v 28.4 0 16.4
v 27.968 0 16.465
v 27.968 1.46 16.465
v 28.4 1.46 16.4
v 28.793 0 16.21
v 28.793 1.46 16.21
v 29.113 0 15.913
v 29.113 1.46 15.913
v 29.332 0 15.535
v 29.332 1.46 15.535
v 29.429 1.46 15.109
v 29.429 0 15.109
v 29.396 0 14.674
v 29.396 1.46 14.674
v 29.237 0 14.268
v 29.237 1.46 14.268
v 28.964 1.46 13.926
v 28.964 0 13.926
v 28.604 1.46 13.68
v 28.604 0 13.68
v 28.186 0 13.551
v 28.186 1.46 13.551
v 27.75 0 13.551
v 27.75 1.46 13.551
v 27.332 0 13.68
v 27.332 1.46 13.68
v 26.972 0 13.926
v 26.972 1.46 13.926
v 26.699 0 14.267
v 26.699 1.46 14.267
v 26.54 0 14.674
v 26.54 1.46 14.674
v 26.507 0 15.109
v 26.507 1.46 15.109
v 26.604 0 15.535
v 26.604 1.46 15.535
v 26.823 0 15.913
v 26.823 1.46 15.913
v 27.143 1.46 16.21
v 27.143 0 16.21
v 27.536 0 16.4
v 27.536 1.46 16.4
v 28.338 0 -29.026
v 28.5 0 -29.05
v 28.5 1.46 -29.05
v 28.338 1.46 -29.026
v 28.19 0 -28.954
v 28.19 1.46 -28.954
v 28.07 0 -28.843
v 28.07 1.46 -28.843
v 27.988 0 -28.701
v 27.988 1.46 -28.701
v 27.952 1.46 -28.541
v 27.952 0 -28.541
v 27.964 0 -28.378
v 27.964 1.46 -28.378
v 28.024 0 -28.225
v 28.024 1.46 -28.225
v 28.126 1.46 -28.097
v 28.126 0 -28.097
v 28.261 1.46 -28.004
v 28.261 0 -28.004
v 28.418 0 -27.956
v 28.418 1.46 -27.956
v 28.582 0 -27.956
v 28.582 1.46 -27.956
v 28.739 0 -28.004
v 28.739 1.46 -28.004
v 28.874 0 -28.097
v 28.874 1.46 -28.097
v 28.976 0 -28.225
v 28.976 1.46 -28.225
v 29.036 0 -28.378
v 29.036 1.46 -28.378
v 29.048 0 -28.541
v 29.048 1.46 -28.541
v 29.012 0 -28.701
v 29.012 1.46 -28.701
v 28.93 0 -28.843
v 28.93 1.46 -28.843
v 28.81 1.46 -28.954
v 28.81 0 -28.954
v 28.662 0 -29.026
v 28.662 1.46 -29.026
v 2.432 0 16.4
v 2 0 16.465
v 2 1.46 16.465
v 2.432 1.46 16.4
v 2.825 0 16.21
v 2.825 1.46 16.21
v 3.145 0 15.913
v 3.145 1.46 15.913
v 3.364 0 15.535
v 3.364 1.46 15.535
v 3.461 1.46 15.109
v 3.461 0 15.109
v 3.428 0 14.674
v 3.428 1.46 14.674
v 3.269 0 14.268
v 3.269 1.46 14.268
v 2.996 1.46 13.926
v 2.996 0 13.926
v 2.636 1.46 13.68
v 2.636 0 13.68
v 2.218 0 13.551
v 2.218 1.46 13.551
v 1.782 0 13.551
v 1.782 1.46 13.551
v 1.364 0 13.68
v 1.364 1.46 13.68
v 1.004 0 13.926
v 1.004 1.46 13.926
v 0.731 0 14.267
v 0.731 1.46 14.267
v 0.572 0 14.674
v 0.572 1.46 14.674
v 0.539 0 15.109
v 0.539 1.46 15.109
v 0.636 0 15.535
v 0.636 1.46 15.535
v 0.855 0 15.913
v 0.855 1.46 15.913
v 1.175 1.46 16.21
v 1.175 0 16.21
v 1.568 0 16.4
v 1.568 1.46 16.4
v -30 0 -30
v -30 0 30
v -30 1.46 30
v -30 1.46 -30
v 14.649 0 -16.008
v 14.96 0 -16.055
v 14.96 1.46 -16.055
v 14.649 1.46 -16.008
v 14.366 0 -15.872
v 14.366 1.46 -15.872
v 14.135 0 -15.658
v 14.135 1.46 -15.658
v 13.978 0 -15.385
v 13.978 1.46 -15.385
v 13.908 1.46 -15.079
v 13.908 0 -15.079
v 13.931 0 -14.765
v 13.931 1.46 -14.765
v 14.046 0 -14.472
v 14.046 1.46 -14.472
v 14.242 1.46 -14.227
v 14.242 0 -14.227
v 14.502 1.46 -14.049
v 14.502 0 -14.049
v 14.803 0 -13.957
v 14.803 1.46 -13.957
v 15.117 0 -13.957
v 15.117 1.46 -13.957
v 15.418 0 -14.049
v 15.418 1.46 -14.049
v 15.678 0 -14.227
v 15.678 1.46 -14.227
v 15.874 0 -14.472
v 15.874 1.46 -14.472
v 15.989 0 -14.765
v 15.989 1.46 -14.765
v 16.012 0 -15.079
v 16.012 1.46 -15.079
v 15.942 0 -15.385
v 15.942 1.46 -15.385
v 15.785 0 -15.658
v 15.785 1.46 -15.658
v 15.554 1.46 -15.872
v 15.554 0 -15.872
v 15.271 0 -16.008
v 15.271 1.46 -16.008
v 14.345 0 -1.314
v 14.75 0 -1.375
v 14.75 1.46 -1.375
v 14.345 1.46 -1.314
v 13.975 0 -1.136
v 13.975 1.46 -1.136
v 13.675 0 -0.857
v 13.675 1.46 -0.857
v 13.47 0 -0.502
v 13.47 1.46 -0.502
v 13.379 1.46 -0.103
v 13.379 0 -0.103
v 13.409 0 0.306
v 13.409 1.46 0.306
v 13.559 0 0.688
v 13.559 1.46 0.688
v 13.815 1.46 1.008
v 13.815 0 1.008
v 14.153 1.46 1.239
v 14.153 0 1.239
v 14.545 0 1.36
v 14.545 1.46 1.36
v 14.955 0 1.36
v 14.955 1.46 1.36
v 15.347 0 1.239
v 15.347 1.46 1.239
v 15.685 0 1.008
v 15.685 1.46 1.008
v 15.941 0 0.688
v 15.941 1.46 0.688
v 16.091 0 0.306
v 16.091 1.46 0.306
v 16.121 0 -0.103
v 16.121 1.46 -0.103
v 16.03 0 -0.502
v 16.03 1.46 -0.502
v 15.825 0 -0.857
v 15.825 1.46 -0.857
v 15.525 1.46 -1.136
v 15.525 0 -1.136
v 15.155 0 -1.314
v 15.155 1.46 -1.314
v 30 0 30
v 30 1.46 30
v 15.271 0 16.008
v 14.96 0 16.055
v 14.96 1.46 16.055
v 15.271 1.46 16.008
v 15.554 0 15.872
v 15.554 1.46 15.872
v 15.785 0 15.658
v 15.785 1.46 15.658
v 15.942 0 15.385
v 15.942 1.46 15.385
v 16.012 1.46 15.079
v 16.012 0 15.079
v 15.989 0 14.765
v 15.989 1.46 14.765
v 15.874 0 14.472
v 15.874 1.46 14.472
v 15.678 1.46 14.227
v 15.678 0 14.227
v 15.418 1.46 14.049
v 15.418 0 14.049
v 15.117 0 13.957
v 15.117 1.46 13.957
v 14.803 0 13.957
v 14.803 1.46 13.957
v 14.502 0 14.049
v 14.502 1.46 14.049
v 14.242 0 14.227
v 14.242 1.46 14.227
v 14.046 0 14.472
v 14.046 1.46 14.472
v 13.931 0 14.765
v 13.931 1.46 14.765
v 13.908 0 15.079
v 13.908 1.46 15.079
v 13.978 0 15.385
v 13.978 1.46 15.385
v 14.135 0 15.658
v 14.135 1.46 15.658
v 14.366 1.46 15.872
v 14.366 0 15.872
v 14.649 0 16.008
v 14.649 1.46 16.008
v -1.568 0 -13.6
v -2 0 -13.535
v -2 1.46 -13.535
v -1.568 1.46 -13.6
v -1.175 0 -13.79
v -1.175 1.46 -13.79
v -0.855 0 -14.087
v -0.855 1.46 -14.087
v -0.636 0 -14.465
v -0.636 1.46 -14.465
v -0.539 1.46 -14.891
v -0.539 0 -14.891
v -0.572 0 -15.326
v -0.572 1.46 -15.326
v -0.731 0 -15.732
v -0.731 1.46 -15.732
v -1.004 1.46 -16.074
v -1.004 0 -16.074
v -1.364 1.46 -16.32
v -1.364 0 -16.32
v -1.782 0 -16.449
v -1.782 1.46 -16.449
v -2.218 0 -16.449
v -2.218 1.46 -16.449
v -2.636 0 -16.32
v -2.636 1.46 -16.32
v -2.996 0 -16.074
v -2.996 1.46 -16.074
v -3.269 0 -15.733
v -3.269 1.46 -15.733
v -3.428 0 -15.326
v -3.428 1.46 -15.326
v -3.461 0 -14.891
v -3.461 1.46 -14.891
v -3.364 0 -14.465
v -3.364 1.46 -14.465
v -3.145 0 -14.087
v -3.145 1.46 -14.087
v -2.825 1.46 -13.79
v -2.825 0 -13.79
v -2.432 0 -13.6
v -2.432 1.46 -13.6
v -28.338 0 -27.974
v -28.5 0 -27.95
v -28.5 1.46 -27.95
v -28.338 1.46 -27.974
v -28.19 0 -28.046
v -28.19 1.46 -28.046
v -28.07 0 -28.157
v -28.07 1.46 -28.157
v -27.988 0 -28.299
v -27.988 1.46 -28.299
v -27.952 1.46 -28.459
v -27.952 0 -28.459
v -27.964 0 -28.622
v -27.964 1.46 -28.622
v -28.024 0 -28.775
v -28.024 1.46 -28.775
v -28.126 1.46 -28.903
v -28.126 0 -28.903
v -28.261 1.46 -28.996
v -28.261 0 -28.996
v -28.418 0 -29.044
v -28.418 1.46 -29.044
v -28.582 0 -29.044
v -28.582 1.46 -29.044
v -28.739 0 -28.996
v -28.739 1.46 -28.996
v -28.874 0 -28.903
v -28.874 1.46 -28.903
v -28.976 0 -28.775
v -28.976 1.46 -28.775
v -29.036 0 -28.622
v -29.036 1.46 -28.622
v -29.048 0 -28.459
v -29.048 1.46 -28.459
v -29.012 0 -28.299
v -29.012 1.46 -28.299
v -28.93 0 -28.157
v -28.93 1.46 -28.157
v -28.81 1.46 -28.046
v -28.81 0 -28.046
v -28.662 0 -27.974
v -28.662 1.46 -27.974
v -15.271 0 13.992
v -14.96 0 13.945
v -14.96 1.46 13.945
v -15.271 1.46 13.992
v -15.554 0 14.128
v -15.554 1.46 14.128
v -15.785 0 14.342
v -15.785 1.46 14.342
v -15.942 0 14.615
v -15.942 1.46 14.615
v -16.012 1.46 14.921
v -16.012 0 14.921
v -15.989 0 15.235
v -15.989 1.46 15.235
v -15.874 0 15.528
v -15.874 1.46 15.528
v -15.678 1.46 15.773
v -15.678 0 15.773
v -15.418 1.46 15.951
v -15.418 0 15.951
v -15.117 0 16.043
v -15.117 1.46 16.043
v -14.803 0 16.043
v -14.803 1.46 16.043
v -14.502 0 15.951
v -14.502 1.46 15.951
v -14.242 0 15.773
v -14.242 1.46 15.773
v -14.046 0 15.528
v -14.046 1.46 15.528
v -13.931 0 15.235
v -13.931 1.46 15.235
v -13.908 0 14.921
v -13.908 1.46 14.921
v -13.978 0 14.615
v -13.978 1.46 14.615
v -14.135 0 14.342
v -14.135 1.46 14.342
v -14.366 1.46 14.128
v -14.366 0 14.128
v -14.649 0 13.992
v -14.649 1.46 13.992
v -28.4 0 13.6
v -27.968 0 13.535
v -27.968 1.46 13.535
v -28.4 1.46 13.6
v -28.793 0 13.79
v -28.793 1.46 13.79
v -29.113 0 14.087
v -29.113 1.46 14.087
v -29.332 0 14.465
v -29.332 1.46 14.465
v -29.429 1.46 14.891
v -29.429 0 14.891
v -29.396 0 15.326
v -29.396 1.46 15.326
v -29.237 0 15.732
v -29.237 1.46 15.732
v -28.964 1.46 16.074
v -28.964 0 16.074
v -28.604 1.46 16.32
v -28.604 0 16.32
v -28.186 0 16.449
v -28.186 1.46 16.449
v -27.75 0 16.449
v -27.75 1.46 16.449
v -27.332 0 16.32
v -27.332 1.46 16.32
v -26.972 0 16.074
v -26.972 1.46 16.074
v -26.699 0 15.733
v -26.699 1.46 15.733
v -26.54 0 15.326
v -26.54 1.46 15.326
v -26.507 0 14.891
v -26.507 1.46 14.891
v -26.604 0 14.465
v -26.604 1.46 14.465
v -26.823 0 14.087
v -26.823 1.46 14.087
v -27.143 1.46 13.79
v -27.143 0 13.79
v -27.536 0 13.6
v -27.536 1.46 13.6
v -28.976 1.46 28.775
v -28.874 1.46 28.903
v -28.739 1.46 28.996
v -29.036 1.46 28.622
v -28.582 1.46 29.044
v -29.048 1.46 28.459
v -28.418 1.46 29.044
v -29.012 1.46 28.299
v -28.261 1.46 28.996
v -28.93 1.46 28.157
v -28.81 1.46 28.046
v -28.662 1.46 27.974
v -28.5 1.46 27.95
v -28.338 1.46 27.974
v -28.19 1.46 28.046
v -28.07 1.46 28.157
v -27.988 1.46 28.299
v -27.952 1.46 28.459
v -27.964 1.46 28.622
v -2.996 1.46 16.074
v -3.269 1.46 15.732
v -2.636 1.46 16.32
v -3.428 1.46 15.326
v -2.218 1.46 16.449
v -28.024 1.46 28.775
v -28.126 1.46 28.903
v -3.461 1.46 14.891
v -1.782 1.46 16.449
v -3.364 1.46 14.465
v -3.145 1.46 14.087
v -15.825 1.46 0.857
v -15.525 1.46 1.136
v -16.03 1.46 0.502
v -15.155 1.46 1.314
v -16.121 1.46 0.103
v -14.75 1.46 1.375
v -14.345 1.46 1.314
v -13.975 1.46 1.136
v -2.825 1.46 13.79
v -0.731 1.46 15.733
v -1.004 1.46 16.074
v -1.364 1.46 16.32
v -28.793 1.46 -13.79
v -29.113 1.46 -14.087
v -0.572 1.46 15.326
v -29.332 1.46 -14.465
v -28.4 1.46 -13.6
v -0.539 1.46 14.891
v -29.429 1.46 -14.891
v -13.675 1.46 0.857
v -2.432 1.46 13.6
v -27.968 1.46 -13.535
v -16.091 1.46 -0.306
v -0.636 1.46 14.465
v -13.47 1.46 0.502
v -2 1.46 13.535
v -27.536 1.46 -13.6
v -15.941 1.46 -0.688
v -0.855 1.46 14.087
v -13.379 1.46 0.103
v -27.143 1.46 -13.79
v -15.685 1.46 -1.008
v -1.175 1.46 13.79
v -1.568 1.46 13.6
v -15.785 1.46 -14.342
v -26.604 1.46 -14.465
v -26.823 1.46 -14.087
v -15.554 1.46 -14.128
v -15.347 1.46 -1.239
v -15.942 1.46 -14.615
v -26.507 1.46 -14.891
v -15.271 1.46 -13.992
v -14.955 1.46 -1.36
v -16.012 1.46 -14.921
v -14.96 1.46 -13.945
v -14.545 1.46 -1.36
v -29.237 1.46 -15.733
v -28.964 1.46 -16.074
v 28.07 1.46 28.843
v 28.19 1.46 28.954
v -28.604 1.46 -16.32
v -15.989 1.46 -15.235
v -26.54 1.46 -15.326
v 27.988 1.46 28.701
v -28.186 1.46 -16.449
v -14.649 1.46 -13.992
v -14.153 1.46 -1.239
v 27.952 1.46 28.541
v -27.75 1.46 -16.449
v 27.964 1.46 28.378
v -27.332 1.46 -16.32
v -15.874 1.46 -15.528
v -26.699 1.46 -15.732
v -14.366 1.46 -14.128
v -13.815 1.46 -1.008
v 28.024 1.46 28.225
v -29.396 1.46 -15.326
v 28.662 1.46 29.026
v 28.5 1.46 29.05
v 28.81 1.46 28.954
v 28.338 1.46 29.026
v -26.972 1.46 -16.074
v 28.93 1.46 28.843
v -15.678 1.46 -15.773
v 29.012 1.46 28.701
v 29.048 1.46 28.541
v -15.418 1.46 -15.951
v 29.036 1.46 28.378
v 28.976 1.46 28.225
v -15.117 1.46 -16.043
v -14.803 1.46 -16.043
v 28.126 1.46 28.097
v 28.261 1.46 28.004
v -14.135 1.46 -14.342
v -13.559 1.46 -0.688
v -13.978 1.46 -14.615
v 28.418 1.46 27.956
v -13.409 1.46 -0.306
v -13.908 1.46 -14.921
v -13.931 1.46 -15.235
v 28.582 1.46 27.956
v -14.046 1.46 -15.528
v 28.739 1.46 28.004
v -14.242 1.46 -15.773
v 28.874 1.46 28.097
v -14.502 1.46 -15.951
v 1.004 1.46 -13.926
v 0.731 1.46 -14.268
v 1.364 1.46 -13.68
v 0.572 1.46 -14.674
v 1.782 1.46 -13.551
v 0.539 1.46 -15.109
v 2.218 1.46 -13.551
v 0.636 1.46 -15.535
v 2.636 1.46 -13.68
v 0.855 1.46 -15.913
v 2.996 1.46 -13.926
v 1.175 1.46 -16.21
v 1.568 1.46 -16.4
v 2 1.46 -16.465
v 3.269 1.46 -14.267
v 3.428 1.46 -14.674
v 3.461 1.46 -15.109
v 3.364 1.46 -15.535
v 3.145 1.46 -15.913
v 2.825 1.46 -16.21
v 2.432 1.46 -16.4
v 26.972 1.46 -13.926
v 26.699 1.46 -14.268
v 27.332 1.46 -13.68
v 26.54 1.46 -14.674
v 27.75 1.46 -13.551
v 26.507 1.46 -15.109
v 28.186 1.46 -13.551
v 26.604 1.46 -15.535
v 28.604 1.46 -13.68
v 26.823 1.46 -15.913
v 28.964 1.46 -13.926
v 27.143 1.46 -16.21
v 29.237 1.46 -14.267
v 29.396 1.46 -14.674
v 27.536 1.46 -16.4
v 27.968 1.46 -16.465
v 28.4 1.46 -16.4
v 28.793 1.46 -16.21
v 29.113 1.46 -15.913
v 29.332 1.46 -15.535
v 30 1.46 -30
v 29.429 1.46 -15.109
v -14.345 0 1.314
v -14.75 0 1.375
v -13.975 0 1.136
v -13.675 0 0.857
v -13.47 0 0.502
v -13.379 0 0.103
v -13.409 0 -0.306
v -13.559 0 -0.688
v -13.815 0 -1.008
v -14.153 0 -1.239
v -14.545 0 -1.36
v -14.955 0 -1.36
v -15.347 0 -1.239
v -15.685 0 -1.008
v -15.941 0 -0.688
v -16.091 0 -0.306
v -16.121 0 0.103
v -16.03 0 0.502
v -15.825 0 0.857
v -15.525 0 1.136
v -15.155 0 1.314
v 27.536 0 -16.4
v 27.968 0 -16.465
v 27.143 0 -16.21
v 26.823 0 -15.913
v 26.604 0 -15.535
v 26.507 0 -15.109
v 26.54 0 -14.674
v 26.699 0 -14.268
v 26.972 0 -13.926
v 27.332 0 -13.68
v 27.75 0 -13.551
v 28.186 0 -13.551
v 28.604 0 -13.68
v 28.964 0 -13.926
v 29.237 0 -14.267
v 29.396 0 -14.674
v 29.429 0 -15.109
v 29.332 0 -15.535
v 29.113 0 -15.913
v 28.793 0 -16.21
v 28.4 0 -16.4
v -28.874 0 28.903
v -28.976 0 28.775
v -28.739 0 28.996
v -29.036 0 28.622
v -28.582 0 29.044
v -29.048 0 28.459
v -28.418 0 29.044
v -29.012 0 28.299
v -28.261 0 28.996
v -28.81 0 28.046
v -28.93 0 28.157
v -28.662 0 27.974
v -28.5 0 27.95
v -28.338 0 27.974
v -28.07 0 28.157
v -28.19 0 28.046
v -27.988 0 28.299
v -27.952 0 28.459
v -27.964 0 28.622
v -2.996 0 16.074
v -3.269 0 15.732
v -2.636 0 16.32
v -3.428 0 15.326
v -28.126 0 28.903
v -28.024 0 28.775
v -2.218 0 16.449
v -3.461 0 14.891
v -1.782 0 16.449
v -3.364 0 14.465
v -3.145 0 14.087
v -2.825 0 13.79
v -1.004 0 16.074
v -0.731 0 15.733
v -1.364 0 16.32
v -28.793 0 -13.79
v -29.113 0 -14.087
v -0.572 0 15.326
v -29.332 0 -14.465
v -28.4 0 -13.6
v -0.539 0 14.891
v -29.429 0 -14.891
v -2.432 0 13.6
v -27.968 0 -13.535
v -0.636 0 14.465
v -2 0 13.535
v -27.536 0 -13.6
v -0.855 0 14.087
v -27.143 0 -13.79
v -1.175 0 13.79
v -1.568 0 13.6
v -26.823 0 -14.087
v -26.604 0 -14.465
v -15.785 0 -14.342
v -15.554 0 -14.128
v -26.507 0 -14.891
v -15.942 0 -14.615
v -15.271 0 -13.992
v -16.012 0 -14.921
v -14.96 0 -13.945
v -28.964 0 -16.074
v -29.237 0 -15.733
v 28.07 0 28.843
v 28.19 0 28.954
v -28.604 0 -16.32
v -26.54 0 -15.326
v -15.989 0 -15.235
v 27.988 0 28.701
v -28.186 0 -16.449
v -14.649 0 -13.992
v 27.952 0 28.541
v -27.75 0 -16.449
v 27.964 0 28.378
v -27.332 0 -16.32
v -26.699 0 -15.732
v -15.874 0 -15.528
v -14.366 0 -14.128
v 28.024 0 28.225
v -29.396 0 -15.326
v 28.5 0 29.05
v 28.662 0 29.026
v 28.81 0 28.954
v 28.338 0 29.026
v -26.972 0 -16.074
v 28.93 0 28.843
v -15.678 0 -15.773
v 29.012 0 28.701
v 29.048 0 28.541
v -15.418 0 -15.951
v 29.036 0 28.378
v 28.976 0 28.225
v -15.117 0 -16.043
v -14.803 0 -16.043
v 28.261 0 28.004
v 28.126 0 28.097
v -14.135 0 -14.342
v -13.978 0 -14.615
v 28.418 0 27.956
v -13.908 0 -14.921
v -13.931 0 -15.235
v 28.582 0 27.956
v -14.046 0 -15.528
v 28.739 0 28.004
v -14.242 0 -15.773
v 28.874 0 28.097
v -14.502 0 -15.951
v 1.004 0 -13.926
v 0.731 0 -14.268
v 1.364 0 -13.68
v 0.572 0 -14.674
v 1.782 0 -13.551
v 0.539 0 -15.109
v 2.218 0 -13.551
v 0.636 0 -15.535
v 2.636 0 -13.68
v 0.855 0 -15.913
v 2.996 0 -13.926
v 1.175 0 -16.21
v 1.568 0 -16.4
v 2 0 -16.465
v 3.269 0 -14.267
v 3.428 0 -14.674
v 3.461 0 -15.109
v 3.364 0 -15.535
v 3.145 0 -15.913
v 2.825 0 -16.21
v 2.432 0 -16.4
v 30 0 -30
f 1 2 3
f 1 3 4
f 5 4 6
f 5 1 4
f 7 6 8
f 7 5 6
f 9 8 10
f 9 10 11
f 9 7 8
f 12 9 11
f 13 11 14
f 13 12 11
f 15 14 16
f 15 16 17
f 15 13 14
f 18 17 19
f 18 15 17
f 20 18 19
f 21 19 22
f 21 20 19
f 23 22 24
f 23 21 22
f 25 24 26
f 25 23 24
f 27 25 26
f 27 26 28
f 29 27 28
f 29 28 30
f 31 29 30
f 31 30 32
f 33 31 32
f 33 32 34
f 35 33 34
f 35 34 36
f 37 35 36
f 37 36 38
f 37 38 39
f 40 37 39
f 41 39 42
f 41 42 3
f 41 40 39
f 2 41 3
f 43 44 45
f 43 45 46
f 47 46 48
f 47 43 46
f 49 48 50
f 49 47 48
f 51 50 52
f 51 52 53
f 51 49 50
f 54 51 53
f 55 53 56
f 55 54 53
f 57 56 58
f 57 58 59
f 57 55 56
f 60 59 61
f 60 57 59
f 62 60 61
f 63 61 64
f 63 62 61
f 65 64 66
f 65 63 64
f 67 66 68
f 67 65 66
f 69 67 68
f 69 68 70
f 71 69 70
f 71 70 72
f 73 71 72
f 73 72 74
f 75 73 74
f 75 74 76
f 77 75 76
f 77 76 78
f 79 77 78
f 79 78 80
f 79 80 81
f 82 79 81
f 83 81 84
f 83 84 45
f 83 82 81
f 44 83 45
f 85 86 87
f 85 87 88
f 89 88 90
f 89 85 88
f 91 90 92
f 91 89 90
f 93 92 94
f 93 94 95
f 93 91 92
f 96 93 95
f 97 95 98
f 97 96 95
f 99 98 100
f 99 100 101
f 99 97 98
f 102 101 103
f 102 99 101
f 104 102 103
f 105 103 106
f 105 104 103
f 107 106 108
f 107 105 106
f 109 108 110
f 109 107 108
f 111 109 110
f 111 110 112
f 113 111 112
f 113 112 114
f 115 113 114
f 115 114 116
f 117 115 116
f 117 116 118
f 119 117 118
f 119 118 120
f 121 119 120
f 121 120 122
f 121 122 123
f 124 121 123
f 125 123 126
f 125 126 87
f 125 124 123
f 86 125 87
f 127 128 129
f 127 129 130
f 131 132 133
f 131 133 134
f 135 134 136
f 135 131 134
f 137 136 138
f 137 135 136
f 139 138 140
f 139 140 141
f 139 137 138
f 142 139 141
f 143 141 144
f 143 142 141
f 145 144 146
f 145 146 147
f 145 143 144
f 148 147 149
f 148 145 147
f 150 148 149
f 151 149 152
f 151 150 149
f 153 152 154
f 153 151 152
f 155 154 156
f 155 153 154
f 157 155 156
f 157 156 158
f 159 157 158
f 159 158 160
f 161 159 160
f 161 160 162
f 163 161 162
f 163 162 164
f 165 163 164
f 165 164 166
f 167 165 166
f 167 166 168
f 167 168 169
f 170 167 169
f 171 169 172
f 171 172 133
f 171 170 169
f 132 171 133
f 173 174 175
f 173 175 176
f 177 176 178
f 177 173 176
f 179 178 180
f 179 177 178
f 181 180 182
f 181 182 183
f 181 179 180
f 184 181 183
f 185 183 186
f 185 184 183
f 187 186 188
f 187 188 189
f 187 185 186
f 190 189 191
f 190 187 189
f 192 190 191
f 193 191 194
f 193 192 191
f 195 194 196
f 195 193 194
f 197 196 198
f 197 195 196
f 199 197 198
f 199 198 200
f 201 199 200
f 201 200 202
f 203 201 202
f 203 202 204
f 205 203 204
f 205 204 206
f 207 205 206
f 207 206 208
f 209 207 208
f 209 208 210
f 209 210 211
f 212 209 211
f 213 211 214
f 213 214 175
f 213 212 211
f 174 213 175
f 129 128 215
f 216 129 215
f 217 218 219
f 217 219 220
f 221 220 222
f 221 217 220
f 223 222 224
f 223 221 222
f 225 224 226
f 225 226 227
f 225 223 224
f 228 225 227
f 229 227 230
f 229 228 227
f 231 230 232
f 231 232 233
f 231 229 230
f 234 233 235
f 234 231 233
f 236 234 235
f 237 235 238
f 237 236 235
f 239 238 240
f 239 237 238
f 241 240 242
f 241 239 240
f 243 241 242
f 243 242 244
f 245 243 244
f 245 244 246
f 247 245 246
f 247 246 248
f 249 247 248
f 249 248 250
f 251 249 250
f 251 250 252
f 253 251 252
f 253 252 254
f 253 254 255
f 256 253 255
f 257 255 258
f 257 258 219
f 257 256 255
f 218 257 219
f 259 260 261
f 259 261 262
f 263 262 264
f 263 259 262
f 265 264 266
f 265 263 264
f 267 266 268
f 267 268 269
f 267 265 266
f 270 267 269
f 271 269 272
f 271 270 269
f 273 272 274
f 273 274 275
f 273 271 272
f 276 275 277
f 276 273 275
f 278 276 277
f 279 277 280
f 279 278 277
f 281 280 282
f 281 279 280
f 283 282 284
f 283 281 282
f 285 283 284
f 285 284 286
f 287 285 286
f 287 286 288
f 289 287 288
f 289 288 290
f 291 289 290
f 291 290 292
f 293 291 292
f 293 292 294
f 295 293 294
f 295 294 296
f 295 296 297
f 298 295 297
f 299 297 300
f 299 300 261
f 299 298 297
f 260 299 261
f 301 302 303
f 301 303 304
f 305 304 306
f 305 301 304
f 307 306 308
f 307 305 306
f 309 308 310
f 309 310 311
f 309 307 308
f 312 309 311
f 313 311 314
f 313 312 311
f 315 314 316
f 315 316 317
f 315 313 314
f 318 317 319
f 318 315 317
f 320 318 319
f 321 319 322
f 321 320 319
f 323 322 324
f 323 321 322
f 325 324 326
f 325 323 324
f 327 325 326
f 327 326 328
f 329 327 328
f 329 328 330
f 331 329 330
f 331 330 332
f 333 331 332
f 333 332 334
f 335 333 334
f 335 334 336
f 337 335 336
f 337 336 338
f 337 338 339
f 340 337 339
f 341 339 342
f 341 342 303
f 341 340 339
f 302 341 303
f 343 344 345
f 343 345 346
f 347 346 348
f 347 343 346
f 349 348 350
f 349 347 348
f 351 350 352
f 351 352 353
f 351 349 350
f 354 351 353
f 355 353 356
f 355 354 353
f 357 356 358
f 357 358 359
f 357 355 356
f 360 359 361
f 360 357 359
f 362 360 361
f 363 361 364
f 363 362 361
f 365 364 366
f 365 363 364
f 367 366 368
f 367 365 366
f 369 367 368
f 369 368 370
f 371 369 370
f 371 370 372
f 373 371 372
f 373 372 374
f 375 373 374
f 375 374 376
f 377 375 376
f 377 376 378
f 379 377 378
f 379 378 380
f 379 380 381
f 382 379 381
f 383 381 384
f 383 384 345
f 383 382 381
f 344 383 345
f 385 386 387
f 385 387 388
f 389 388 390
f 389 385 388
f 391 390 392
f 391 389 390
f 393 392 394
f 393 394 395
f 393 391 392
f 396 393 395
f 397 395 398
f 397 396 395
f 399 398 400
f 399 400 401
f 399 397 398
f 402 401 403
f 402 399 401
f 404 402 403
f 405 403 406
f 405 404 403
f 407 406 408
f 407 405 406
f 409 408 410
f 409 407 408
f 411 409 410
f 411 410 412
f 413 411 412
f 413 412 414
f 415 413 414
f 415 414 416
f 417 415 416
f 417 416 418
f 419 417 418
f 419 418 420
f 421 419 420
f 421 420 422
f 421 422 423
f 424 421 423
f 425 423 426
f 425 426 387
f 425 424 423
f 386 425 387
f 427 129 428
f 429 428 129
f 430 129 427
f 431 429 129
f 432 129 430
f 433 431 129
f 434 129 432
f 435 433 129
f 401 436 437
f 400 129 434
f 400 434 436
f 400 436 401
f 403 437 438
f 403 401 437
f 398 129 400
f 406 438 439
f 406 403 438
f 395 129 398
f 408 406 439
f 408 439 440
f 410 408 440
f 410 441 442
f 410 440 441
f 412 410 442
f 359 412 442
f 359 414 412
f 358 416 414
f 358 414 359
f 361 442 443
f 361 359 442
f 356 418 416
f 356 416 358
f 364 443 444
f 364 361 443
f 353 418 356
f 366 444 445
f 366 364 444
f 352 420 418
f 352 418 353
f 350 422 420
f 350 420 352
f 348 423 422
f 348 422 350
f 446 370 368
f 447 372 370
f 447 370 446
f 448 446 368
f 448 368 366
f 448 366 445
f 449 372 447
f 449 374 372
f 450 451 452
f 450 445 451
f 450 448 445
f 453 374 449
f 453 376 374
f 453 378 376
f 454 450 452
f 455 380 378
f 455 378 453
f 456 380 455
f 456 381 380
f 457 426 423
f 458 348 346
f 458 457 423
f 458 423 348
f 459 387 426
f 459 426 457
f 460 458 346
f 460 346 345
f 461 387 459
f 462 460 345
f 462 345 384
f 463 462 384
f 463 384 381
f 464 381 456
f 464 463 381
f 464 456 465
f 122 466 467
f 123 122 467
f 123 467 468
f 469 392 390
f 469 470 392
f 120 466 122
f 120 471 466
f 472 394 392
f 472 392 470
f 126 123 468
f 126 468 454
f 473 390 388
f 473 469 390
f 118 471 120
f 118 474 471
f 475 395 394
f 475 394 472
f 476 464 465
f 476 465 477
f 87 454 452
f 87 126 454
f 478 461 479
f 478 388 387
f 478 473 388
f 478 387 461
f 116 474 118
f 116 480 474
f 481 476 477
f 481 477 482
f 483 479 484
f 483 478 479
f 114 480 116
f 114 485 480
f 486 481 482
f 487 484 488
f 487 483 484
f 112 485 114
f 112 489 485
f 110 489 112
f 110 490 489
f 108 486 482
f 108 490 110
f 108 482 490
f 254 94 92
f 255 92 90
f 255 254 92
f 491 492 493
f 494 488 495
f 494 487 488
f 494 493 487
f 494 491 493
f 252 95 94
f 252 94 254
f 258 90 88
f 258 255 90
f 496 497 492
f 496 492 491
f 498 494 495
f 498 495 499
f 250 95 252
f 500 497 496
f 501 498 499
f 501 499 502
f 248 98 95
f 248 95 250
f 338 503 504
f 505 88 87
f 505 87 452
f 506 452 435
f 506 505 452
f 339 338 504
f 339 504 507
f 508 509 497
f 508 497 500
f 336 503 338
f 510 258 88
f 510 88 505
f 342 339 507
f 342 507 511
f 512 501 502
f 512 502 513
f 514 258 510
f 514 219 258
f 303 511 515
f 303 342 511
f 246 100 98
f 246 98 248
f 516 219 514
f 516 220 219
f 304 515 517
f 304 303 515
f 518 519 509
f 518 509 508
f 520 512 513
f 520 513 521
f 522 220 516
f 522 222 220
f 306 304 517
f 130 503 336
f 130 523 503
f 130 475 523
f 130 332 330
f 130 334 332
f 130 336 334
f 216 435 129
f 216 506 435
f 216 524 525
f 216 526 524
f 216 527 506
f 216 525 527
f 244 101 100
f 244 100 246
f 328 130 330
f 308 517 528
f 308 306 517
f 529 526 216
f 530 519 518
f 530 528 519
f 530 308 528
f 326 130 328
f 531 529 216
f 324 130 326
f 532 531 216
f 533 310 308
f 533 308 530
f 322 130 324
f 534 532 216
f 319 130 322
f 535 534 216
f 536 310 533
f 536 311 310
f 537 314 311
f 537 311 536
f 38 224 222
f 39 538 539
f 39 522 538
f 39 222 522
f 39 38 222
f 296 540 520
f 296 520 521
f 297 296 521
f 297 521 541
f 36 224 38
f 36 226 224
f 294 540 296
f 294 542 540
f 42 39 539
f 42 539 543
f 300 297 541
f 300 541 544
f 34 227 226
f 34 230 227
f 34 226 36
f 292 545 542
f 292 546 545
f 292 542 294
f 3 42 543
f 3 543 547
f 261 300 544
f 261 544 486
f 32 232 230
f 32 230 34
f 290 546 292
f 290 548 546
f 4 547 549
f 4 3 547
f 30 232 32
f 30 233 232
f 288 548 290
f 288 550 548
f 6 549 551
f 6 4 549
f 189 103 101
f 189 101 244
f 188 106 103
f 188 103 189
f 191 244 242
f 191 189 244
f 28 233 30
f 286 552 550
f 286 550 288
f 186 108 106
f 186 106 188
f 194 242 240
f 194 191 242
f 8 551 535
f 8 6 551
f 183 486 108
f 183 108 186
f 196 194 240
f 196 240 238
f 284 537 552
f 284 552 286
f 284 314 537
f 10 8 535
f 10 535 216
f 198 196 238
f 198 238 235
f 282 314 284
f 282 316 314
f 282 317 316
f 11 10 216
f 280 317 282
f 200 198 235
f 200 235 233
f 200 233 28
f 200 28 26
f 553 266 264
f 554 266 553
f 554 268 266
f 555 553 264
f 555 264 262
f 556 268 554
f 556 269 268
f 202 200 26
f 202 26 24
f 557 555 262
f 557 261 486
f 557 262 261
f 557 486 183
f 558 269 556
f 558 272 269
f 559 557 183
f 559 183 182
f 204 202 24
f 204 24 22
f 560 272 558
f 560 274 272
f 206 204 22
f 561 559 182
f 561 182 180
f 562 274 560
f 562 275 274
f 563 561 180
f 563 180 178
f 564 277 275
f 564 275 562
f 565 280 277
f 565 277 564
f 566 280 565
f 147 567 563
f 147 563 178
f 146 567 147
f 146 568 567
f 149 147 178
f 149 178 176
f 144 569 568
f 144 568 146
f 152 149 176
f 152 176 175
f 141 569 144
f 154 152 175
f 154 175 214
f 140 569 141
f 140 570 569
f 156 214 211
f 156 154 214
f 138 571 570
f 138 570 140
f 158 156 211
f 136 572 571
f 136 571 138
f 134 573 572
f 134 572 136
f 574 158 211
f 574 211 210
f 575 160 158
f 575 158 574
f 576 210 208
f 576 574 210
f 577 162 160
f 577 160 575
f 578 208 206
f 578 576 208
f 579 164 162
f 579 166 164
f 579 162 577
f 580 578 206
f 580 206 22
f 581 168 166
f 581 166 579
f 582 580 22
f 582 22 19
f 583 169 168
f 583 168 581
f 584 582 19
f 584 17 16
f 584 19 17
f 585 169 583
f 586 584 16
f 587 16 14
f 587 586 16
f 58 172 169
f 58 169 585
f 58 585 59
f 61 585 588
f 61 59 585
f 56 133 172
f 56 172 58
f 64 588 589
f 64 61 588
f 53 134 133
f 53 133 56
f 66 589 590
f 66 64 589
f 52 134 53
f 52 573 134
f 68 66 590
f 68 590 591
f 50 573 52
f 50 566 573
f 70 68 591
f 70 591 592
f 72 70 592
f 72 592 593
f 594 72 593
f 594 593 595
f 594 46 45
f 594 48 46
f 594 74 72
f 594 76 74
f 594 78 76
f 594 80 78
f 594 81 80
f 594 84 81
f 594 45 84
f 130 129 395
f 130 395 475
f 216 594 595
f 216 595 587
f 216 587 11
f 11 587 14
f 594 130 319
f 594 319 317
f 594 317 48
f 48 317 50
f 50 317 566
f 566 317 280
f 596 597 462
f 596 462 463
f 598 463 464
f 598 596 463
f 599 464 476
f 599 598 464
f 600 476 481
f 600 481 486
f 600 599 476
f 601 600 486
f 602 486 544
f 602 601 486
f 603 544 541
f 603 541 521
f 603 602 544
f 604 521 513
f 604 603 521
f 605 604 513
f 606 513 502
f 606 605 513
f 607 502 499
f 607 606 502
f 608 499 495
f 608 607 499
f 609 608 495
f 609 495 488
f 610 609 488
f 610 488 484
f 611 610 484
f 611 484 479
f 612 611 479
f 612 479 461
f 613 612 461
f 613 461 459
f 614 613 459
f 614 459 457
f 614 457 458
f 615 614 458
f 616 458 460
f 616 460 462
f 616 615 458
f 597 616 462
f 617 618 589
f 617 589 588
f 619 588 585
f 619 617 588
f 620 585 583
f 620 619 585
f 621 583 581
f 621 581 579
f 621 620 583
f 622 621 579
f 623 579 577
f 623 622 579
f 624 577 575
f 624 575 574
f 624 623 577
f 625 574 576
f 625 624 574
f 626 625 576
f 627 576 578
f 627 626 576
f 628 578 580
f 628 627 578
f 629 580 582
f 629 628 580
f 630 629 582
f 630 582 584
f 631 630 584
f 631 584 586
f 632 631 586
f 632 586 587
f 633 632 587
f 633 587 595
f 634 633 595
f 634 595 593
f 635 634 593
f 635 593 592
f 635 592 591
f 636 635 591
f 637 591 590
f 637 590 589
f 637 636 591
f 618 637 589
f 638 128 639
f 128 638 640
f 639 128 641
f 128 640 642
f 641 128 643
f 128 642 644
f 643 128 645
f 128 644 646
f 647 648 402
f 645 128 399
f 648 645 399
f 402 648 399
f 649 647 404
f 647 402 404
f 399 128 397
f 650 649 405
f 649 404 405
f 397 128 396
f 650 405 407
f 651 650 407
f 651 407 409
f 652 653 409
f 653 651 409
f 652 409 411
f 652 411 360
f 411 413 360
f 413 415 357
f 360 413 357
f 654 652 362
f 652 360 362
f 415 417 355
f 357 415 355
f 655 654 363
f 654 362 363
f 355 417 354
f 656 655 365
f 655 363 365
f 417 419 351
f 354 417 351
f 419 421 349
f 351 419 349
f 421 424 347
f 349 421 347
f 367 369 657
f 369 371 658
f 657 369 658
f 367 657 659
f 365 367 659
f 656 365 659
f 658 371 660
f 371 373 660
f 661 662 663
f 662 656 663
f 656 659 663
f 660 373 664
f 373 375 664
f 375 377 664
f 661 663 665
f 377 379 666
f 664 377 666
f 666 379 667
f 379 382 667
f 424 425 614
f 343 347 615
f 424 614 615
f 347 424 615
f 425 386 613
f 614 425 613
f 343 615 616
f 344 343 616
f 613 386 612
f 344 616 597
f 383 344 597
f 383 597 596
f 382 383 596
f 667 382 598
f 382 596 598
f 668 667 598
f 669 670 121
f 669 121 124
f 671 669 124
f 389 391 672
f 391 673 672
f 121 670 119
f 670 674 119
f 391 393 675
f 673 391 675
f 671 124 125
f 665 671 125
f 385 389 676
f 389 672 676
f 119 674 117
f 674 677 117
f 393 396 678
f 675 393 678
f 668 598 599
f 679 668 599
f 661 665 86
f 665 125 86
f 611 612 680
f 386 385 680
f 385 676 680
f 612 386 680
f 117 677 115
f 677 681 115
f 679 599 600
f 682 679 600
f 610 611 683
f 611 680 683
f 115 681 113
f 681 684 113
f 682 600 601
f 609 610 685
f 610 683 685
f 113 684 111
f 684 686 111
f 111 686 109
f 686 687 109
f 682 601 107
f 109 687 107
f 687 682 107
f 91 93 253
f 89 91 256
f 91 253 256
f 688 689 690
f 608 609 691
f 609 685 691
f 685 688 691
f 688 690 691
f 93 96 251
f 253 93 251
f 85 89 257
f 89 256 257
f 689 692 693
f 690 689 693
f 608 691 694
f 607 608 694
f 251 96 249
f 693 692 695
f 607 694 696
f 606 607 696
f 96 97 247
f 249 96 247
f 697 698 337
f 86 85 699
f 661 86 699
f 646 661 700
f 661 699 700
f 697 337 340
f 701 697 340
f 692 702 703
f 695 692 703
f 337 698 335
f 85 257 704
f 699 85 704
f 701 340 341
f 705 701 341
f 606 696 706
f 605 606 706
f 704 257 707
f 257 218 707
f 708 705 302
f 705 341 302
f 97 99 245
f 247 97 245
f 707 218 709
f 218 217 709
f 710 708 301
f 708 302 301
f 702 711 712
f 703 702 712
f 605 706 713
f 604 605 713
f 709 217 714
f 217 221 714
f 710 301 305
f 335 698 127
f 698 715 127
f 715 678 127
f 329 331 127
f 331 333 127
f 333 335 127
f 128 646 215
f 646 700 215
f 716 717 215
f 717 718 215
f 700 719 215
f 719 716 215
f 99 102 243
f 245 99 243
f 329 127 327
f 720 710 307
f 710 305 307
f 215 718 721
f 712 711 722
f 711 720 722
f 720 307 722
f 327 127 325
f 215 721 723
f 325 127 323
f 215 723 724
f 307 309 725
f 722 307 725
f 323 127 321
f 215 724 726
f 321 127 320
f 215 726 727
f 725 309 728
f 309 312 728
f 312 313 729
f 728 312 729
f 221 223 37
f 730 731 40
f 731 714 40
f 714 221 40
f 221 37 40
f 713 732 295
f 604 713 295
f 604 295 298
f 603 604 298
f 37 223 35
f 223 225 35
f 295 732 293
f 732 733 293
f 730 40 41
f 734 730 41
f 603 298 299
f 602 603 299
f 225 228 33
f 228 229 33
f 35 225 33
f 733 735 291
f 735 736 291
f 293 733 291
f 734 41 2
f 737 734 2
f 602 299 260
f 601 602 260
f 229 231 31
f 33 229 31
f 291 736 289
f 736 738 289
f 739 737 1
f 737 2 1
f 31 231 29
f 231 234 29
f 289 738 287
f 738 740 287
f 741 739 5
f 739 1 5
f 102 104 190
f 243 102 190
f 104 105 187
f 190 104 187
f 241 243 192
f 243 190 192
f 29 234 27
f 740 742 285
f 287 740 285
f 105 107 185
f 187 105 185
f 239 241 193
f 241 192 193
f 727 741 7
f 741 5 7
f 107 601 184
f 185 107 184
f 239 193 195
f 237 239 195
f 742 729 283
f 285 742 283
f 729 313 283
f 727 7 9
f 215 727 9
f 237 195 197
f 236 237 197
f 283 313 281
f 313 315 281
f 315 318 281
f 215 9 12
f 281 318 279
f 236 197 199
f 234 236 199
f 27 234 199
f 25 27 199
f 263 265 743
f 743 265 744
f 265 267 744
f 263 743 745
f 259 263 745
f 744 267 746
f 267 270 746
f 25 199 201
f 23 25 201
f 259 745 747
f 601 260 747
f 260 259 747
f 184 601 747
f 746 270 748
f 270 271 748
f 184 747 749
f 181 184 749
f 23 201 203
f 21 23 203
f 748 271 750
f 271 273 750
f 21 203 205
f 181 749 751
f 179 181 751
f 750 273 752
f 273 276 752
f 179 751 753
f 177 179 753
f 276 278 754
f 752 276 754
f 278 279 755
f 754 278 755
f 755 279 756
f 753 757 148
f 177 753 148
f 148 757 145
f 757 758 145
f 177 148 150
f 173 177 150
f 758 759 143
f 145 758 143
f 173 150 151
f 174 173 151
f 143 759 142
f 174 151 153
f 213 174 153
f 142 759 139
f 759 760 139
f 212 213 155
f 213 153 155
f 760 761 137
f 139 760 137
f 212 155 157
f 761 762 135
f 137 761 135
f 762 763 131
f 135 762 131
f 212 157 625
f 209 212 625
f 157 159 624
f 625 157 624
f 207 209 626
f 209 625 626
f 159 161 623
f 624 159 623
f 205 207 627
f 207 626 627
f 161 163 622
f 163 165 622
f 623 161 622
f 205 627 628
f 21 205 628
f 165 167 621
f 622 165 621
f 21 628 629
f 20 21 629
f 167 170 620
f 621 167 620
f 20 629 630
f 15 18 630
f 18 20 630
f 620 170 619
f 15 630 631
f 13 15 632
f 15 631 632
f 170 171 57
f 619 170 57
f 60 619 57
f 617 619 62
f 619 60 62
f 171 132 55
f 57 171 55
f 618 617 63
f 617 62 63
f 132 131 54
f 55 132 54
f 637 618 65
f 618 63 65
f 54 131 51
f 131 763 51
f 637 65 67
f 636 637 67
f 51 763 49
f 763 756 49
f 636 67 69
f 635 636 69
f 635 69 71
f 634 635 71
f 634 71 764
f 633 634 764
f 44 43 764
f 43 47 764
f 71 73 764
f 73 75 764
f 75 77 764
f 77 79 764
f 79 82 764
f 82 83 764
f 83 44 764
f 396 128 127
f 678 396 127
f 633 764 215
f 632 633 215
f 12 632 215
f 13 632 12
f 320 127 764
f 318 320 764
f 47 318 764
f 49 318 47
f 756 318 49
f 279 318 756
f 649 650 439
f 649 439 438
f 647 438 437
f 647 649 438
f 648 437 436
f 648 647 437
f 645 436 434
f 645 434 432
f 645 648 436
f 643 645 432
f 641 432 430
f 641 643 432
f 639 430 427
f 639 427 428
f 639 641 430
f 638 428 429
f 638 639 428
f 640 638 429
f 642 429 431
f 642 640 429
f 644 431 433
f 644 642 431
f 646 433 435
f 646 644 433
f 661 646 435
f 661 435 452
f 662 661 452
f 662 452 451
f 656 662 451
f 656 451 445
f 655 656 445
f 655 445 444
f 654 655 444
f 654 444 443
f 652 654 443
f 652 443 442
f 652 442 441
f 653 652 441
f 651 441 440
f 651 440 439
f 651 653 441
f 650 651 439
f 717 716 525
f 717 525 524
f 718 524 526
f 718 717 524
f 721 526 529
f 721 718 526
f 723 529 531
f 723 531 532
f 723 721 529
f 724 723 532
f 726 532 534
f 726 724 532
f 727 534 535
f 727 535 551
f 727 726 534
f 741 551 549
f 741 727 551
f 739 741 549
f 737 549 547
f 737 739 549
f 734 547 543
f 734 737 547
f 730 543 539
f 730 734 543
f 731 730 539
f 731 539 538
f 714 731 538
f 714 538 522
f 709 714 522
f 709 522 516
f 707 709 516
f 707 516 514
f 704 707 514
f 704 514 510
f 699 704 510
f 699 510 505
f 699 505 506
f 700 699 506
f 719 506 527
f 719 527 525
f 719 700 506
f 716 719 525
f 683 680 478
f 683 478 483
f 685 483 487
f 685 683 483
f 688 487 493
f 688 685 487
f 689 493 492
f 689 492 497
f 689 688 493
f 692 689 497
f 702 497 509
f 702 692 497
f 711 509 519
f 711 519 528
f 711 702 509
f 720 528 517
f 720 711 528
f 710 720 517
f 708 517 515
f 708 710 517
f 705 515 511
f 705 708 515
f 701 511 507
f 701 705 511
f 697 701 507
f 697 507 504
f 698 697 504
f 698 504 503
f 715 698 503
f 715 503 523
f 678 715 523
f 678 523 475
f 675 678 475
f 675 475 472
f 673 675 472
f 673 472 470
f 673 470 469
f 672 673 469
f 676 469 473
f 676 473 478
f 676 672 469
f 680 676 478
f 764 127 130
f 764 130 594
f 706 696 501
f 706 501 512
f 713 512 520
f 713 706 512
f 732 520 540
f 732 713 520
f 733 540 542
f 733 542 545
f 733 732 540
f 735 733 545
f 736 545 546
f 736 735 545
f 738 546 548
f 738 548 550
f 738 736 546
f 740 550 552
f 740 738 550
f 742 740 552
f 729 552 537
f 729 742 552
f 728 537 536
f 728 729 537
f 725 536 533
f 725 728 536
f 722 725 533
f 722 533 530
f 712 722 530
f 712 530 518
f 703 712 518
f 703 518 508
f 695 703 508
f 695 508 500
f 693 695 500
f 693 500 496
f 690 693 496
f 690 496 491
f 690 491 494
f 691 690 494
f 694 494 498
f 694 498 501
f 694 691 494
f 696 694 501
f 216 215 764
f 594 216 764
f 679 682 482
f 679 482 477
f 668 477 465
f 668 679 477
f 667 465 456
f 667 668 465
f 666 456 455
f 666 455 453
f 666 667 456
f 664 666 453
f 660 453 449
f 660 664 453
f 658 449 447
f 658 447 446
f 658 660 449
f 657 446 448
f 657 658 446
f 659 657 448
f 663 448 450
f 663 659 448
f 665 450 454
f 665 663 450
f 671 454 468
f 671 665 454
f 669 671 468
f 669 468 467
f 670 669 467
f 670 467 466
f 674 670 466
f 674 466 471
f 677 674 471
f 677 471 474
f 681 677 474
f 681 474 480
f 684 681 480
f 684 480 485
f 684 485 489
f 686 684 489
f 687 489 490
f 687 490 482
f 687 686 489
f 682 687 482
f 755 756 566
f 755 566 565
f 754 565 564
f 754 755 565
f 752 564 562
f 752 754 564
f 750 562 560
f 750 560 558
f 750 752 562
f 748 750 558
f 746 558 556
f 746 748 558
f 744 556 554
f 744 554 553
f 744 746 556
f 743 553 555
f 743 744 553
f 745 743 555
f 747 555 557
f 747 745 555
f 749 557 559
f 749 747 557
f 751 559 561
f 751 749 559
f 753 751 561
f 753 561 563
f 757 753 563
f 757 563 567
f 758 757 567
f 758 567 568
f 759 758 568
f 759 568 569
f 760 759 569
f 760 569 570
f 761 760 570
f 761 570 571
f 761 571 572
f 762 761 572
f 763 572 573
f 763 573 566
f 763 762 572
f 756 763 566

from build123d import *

# Parameters (mm, degrees)
SKETCH1_W           = 60
SKETCH1_H           = 60
SKETCH1_R           = 0.55
SKETCH1_R_2         = 1.465
SKETCH1_R_3         = 1.375
SKETCH1_R_4         = 1.055
BOSS_EXTRUDE1_DEPTH = 1.46


with BuildPart() as part:
    # Sketch1 → Boss-Extrude1 (new body)
    with BuildSketch(Plane(origin=(0, 0, 0), x_dir=(1, 0, 0), z_dir=(0, 1, 0))):
        Rectangle(SKETCH1_W, SKETCH1_H)
        with Locations(Location((-28.5, 28.5, 0), (0, 0, 270))):
            Circle(SKETCH1_R, mode=Mode.SUBTRACT)
        with Locations(Location((-27.968, 15, 0), (0, 0, 270))):
            Circle(SKETCH1_R_2, mode=Mode.SUBTRACT)
        with Locations(Location((-14.75, 0, 0), (0, 0, 270))):
            Circle(SKETCH1_R_3, mode=Mode.SUBTRACT)
        with Locations(Location((-14.960000108, 15, 0), (0, 0, 270))):
            Circle(SKETCH1_R_4, mode=Mode.SUBTRACT)
        with Locations(Location((-2, 15, 0), (0, 0, 270))):
            Circle(SKETCH1_R_2, mode=Mode.SUBTRACT)
        with Locations(Location((2, 15, 0), (0, 0, 90))):
            Circle(SKETCH1_R_2, mode=Mode.SUBTRACT)
        with Locations(Location((14.960000108, 15, 0), (0, 0, 90))):
            Circle(SKETCH1_R_4, mode=Mode.SUBTRACT)
        with Locations(Location((14.75, 0, 0), (0, 0, 90))):
            Circle(SKETCH1_R_3, mode=Mode.SUBTRACT)
        with Locations(Location((27.968, 15, 0), (0, 0, 90))):
            Circle(SKETCH1_R_2, mode=Mode.SUBTRACT)
        with Locations(Location((28.5, 28.5, 0), (0, 0, 90))):
            Circle(SKETCH1_R, mode=Mode.SUBTRACT)
        with Locations(Location((28.5, -28.5, 0), (0, 0, 270))):
            Circle(SKETCH1_R, mode=Mode.SUBTRACT)
        with Locations(Location((27.968, -15, 0), (0, 0, 270))):
            Circle(SKETCH1_R_2, mode=Mode.SUBTRACT)
        with Locations(Location((14.960000108, -15, 0), (0, 0, 270))):
            Circle(SKETCH1_R_4, mode=Mode.SUBTRACT)
        with Locations(Location((2, -15, 0), (0, 0, 270))):
            Circle(SKETCH1_R_2, mode=Mode.SUBTRACT)
        with Locations(Location((-2, -15, 0), (0, 0, 90))):
            Circle(SKETCH1_R_2, mode=Mode.SUBTRACT)
        with Locations(Location((-14.960000108, -15, 0), (0, 0, 90))):
            Circle(SKETCH1_R_4, mode=Mode.SUBTRACT)
        with Locations(Location((-27.968, -15, 0), (0, 0, 90))):
            Circle(SKETCH1_R_2, mode=Mode.SUBTRACT)
        with Locations(Location((-28.5, -28.5, 0), (0, 0, 90))):
            Circle(SKETCH1_R, mode=Mode.SUBTRACT)
    extrude(amount=BOSS_EXTRUDE1_DEPTH)


solid = part.part
